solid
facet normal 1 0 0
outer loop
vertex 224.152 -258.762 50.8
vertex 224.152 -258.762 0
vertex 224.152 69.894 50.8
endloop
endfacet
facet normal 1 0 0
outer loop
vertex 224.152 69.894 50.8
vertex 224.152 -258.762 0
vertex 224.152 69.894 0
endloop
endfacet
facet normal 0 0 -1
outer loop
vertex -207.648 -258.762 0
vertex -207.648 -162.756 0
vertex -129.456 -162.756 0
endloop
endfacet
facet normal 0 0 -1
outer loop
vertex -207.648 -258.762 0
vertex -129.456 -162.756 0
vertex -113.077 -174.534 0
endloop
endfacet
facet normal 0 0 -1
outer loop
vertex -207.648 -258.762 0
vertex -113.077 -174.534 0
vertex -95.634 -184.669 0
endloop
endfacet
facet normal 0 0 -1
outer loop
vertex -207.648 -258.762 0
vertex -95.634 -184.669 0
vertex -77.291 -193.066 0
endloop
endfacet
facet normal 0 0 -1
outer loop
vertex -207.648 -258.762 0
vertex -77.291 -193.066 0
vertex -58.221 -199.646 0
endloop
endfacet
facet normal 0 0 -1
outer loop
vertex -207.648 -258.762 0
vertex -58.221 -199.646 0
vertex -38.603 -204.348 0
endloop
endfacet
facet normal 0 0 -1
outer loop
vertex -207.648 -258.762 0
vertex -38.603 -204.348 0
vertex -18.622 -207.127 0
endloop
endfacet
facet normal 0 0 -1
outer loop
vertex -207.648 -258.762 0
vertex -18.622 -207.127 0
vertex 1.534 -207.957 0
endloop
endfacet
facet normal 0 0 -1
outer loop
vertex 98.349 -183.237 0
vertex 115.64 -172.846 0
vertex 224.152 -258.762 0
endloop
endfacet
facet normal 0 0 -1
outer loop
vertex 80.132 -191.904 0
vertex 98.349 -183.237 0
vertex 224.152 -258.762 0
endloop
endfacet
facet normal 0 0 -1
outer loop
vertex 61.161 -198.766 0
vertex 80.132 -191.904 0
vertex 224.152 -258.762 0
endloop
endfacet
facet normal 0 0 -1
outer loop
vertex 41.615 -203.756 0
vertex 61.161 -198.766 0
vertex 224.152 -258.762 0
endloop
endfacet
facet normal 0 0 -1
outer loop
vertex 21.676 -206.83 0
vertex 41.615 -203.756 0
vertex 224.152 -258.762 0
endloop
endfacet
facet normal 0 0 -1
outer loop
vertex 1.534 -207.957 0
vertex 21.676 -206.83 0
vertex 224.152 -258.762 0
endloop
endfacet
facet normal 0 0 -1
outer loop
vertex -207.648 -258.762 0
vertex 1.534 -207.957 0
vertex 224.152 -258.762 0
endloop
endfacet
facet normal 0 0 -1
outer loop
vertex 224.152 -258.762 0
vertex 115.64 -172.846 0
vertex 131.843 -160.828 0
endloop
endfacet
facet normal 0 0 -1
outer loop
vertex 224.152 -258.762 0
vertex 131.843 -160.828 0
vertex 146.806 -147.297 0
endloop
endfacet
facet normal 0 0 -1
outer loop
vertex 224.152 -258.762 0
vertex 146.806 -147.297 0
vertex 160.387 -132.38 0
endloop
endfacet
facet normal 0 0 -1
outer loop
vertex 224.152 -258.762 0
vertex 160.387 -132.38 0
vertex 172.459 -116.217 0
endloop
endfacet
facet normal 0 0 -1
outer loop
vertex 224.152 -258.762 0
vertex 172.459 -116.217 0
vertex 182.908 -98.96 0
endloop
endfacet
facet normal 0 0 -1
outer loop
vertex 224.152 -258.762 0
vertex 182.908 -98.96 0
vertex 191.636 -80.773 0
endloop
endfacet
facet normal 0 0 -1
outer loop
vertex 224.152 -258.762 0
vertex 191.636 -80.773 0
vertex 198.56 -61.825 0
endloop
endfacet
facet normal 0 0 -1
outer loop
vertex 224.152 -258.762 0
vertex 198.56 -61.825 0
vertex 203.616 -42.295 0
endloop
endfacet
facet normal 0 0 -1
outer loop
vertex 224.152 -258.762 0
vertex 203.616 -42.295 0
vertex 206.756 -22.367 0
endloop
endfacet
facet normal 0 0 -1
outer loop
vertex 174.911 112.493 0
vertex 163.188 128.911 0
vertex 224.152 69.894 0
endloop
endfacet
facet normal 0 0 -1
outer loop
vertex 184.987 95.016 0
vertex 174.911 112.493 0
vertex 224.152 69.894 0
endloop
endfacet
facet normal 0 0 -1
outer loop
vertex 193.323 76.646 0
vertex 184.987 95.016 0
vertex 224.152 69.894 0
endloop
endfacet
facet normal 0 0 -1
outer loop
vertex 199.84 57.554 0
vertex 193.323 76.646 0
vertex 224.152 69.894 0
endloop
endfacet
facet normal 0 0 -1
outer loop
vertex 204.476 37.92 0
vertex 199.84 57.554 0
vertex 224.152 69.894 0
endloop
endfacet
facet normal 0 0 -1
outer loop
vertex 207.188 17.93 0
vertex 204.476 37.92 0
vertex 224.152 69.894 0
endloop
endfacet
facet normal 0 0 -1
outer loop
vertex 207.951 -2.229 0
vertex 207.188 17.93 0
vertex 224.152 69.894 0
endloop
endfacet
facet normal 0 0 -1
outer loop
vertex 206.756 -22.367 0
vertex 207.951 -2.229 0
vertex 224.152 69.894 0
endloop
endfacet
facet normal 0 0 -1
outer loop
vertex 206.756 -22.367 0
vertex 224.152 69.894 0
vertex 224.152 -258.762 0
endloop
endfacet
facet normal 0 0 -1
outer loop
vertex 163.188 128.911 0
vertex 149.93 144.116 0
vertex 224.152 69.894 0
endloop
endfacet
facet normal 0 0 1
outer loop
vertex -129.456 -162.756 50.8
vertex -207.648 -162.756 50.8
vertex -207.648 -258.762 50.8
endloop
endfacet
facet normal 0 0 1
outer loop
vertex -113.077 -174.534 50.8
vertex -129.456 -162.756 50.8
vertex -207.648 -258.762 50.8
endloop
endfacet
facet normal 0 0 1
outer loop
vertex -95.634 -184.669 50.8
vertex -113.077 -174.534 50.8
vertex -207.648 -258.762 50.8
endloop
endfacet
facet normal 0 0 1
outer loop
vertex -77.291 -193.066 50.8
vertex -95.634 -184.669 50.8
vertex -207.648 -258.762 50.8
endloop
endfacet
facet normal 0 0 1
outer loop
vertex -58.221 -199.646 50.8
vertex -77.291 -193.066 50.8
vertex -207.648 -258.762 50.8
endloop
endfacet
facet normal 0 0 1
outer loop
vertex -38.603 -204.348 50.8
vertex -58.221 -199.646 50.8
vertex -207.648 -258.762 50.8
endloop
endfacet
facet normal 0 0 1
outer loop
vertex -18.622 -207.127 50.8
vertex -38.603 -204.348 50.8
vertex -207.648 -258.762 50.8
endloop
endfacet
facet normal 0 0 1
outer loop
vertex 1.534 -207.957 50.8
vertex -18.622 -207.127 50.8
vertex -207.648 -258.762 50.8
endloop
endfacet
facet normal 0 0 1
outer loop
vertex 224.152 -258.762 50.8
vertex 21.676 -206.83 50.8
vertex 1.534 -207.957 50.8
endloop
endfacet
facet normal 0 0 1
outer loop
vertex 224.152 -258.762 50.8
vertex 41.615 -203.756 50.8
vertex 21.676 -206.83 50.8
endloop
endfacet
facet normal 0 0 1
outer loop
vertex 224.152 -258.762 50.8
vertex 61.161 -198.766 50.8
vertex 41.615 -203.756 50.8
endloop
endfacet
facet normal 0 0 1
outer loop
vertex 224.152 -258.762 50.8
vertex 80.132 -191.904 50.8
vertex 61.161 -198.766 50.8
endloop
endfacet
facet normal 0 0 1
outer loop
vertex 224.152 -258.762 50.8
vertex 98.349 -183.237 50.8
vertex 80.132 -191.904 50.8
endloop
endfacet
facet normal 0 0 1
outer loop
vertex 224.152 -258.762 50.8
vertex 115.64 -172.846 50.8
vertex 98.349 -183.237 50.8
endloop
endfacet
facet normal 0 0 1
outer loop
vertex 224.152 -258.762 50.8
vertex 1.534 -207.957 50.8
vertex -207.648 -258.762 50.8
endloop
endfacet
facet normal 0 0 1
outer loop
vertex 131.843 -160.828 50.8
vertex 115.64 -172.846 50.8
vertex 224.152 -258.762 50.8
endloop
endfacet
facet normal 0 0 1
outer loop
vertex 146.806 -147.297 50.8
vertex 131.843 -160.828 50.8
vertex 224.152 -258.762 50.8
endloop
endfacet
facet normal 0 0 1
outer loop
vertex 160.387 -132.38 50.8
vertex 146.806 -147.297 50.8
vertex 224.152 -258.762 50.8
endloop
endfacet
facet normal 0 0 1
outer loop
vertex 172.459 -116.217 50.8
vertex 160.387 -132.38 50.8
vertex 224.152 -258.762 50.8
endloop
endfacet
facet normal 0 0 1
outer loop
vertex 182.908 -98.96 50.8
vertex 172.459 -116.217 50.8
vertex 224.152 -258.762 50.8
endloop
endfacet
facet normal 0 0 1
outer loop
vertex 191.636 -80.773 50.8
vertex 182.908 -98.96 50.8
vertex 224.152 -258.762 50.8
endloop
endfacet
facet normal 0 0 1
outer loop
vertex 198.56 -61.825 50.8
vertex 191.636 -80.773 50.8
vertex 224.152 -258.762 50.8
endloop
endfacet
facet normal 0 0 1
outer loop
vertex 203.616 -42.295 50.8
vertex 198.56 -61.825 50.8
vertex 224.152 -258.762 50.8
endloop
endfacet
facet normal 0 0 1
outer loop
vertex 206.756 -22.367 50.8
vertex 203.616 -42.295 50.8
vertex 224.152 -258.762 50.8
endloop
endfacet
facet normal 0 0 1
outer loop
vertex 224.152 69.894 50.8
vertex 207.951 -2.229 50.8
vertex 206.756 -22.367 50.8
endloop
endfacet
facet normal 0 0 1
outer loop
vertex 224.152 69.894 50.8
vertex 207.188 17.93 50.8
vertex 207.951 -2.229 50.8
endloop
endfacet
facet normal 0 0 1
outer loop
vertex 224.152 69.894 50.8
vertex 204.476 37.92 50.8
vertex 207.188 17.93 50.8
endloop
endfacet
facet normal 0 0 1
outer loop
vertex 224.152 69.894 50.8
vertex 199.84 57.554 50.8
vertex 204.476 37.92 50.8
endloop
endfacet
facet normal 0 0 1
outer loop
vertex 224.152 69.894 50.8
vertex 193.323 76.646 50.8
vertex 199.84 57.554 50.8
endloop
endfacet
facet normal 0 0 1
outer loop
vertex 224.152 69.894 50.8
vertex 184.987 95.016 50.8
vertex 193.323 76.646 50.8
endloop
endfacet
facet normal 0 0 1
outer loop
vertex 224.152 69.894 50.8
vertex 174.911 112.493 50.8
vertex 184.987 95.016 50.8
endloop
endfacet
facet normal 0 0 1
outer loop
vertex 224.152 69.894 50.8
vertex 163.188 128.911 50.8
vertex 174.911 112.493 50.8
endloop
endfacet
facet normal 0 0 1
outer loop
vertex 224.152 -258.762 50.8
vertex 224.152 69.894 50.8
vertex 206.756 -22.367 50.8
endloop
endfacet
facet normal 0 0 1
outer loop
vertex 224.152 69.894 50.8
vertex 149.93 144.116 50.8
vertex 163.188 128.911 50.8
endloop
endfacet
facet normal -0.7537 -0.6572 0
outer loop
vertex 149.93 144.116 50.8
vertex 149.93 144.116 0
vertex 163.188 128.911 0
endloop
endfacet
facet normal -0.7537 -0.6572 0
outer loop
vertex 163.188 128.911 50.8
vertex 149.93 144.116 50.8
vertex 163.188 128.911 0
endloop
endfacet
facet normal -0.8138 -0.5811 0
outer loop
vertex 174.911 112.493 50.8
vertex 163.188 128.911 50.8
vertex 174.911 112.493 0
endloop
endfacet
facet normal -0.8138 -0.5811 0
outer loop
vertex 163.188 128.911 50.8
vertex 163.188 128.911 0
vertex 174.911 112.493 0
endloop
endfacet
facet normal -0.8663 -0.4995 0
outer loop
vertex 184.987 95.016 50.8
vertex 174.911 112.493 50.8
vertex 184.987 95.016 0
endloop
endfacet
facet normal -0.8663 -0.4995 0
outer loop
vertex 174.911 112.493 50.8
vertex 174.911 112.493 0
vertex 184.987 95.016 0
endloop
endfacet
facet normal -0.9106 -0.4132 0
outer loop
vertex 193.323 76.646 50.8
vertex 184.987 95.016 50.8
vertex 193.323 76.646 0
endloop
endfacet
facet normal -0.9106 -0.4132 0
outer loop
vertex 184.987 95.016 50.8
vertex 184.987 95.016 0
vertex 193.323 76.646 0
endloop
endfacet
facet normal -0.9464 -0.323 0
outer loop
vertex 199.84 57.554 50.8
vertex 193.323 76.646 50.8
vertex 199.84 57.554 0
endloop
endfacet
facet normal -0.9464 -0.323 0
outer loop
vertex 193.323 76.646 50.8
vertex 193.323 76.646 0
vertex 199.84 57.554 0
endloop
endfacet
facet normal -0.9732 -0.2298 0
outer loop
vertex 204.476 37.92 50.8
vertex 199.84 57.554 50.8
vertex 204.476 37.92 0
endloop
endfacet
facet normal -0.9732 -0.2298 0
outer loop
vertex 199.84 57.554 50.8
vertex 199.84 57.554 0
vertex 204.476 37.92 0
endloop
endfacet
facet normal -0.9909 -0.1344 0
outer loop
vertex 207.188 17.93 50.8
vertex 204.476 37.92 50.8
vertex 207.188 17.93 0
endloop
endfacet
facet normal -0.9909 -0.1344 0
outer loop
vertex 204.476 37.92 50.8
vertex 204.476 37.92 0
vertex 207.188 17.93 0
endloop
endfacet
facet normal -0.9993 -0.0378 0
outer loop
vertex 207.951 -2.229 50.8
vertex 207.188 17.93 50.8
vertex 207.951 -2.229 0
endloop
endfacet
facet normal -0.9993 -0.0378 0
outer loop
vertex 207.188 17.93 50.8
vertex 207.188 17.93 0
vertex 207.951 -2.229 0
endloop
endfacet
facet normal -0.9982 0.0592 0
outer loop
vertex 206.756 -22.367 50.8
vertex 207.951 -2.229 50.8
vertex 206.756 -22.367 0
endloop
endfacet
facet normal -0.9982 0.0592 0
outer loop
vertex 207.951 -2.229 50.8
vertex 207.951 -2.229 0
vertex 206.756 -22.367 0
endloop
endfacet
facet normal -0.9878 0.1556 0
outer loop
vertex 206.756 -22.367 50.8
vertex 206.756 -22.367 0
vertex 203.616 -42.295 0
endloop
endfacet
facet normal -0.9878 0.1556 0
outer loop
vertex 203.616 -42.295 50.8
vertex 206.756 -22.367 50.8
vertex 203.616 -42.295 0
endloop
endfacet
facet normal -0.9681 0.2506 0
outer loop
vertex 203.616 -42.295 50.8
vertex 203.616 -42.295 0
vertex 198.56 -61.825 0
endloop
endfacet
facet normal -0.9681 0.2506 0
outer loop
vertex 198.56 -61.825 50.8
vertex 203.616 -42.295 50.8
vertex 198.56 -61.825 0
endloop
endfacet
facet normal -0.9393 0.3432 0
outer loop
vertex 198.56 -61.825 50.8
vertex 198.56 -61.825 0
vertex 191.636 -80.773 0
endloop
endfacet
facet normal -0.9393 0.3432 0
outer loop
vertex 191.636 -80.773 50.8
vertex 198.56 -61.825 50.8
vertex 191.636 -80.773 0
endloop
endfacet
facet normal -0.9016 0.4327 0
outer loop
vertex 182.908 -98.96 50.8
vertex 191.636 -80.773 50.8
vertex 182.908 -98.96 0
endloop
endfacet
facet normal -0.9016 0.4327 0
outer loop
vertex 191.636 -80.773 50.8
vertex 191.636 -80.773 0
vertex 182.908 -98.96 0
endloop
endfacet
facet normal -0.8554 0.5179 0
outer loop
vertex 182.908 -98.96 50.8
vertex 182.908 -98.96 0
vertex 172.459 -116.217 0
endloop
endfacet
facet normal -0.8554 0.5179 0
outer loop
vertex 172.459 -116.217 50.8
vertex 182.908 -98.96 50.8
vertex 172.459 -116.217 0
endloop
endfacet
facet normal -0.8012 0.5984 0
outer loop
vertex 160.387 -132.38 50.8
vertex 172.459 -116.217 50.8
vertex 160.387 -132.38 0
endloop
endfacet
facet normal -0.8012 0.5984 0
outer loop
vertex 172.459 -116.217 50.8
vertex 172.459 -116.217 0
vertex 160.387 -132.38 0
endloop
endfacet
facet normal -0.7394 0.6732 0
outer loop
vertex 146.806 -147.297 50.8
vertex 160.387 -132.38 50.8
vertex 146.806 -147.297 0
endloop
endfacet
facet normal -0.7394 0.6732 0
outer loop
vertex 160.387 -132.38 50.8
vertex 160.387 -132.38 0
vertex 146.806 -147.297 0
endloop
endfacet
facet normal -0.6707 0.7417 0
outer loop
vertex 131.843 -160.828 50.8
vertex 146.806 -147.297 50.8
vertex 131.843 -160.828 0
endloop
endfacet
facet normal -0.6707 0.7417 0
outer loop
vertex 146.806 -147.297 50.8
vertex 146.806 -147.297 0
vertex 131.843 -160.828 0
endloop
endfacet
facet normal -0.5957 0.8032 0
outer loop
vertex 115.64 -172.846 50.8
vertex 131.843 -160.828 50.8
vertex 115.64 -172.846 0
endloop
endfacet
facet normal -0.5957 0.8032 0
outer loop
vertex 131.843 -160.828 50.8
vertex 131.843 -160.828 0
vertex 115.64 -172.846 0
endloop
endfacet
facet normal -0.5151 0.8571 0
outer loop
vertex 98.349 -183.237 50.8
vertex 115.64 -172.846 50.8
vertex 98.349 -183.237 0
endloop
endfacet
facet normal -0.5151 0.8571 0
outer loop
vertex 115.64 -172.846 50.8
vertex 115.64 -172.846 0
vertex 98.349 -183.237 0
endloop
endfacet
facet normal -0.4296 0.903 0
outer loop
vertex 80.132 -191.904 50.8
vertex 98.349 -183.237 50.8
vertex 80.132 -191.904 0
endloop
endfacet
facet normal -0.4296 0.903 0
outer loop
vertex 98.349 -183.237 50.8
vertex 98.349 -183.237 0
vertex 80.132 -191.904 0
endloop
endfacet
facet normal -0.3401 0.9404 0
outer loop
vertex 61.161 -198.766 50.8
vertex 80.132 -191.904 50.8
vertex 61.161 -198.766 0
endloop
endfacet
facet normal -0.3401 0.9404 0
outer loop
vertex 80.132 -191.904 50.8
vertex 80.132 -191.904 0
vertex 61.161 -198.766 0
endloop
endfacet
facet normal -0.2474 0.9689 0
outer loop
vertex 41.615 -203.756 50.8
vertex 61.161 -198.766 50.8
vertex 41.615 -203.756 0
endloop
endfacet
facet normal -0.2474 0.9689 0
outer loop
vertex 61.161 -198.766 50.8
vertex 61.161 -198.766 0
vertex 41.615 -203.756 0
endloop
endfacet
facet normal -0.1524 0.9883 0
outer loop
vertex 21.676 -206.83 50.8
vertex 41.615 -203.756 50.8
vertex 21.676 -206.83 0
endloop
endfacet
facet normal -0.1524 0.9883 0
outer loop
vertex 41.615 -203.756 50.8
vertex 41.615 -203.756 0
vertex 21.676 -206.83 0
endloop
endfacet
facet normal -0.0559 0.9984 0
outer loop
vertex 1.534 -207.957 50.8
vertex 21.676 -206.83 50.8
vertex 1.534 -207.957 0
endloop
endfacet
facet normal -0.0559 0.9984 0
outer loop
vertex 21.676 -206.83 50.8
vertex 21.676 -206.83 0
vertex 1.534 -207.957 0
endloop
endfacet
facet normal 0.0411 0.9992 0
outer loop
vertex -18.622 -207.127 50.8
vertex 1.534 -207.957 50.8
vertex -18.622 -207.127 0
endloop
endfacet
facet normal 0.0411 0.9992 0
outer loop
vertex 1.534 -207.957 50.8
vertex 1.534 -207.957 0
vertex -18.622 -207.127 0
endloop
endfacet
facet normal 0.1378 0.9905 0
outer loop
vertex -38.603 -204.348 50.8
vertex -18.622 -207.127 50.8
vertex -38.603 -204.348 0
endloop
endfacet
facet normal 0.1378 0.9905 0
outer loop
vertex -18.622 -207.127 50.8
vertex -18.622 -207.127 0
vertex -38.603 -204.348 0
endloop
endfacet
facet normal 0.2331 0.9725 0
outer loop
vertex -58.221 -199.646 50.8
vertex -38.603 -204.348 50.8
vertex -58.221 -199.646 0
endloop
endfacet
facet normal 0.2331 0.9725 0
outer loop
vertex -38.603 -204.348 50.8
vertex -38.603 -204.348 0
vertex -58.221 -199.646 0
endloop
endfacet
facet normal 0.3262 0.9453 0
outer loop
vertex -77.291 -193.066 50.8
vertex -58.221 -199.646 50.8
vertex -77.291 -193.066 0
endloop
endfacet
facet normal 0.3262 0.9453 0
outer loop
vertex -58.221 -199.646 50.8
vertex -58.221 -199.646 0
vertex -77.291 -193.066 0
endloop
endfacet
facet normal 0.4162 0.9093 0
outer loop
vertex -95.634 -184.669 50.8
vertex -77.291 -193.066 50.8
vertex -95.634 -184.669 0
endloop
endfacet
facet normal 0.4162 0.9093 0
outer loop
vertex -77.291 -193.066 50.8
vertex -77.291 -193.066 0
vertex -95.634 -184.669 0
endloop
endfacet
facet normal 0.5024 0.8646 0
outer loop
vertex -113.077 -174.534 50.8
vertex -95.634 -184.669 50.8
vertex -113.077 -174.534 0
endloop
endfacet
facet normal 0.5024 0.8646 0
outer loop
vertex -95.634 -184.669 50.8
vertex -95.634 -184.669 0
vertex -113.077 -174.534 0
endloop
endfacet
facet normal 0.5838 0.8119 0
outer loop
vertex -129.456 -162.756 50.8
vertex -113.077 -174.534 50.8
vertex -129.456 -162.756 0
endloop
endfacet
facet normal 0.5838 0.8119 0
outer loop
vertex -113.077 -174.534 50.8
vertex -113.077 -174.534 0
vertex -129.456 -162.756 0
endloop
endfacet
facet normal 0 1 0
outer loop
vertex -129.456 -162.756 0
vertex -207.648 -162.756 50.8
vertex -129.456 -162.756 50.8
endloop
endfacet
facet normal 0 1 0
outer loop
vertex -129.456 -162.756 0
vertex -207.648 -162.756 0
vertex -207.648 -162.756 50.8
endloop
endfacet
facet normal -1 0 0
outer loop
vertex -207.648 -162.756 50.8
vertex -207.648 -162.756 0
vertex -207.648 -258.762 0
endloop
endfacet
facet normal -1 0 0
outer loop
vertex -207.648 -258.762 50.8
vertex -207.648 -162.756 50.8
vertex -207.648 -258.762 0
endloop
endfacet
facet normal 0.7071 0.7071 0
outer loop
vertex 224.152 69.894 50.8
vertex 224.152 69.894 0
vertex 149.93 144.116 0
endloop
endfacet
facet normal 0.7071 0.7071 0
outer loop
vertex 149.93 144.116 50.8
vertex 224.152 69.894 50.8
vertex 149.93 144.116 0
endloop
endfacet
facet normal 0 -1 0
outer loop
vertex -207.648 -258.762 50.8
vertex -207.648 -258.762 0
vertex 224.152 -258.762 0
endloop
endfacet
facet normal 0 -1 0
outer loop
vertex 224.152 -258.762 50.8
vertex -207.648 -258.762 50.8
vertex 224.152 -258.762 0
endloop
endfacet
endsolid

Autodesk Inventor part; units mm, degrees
ref_plane "YZ Plane" through (0, 0, 0) normal (1, 0, 0) x (0, 1, 0)
ref_plane "XZ Plane" through (0, 0, 0) normal (0, 1, 0) x (-1, 0, 0)
ref_plane "XY Plane" through (0, 0, 0) normal (0, 0, 1) x (1, 0, 0)
sketch "Sketch1" plane through (0, 0, 0) normal (0, 0, 1) x (1, 0, 0)
  circle A0 centre (0, 0) radius 207.9625
  line L0 (-215.7457, 231.7761) -> (224.1521, 231.7761) construction
  line L1 (224.1521, 231.7761) -> (224.1521, -258.7625) construction
  line L2 (224.1521, -258.7625) -> (-207.6479, -258.7625) construction
  line L3 (0, 0) -> (294.0459, 0) construction
  line L4 (294.0459, 0) -> (62.2698, 231.7761) construction
  line L5 (294.0459, 0) -> (621.8269, 0) construction
  line L6 (-129.4556, -162.7564) -> (-480.3051, -162.7564) construction
  line L7 (-480.3051, -162.7564) -> (-480.3051, 0) construction
  line L8 (-480.3051, 0) -> (-129.4556, 0) construction
  line L9 (-129.4556, 0) -> (-129.4556, -162.7564) construction
  line L10 (62.2698, 231.7761) -> (294.0459, 0) construction
  line L11 (294.0459, 0) -> (599.7721, 305.7262)
  line L12 (599.7721, 305.7262) -> (367.996, 537.5023)
  line L13 (367.996, 537.5023) -> (62.2698, 231.7761)
  line L14 (-207.6479, -162.7564) -> (-207.6479, -258.7625)
  line L15 (-207.6479, -258.7625) -> (224.1521, -258.7625)
  line L16 (224.1521, -258.7625) -> (224.1521, 69.8938)
  line L17 (224.1521, 69.8938) -> (149.9298, 144.1161)
  line L18 (-207.6479, -162.7564) -> (-129.4556, -162.7564)
  line L19 (-207.6479, -258.7625) -> (-207.6479, -162.7564) construction
  line L20 (-215.7457, 0) -> (-215.7457, 231.7761) construction
  line L21 (0, -207.9625) -> (0, -258.7625)
  point P0 (-207.9625, 0)
  dimension "d0" = 415.925
  dimension "d3" = 135
  dimension "d6" = 431.8
  dimension "d7" = 50.8
extrude "Extrusion1" add sketch "Sketch1" along normal blind 50.8 contours A0 L17 L16 L15 L21 | L21 L15 L14 L18 A0
properties part number "main prototype"
